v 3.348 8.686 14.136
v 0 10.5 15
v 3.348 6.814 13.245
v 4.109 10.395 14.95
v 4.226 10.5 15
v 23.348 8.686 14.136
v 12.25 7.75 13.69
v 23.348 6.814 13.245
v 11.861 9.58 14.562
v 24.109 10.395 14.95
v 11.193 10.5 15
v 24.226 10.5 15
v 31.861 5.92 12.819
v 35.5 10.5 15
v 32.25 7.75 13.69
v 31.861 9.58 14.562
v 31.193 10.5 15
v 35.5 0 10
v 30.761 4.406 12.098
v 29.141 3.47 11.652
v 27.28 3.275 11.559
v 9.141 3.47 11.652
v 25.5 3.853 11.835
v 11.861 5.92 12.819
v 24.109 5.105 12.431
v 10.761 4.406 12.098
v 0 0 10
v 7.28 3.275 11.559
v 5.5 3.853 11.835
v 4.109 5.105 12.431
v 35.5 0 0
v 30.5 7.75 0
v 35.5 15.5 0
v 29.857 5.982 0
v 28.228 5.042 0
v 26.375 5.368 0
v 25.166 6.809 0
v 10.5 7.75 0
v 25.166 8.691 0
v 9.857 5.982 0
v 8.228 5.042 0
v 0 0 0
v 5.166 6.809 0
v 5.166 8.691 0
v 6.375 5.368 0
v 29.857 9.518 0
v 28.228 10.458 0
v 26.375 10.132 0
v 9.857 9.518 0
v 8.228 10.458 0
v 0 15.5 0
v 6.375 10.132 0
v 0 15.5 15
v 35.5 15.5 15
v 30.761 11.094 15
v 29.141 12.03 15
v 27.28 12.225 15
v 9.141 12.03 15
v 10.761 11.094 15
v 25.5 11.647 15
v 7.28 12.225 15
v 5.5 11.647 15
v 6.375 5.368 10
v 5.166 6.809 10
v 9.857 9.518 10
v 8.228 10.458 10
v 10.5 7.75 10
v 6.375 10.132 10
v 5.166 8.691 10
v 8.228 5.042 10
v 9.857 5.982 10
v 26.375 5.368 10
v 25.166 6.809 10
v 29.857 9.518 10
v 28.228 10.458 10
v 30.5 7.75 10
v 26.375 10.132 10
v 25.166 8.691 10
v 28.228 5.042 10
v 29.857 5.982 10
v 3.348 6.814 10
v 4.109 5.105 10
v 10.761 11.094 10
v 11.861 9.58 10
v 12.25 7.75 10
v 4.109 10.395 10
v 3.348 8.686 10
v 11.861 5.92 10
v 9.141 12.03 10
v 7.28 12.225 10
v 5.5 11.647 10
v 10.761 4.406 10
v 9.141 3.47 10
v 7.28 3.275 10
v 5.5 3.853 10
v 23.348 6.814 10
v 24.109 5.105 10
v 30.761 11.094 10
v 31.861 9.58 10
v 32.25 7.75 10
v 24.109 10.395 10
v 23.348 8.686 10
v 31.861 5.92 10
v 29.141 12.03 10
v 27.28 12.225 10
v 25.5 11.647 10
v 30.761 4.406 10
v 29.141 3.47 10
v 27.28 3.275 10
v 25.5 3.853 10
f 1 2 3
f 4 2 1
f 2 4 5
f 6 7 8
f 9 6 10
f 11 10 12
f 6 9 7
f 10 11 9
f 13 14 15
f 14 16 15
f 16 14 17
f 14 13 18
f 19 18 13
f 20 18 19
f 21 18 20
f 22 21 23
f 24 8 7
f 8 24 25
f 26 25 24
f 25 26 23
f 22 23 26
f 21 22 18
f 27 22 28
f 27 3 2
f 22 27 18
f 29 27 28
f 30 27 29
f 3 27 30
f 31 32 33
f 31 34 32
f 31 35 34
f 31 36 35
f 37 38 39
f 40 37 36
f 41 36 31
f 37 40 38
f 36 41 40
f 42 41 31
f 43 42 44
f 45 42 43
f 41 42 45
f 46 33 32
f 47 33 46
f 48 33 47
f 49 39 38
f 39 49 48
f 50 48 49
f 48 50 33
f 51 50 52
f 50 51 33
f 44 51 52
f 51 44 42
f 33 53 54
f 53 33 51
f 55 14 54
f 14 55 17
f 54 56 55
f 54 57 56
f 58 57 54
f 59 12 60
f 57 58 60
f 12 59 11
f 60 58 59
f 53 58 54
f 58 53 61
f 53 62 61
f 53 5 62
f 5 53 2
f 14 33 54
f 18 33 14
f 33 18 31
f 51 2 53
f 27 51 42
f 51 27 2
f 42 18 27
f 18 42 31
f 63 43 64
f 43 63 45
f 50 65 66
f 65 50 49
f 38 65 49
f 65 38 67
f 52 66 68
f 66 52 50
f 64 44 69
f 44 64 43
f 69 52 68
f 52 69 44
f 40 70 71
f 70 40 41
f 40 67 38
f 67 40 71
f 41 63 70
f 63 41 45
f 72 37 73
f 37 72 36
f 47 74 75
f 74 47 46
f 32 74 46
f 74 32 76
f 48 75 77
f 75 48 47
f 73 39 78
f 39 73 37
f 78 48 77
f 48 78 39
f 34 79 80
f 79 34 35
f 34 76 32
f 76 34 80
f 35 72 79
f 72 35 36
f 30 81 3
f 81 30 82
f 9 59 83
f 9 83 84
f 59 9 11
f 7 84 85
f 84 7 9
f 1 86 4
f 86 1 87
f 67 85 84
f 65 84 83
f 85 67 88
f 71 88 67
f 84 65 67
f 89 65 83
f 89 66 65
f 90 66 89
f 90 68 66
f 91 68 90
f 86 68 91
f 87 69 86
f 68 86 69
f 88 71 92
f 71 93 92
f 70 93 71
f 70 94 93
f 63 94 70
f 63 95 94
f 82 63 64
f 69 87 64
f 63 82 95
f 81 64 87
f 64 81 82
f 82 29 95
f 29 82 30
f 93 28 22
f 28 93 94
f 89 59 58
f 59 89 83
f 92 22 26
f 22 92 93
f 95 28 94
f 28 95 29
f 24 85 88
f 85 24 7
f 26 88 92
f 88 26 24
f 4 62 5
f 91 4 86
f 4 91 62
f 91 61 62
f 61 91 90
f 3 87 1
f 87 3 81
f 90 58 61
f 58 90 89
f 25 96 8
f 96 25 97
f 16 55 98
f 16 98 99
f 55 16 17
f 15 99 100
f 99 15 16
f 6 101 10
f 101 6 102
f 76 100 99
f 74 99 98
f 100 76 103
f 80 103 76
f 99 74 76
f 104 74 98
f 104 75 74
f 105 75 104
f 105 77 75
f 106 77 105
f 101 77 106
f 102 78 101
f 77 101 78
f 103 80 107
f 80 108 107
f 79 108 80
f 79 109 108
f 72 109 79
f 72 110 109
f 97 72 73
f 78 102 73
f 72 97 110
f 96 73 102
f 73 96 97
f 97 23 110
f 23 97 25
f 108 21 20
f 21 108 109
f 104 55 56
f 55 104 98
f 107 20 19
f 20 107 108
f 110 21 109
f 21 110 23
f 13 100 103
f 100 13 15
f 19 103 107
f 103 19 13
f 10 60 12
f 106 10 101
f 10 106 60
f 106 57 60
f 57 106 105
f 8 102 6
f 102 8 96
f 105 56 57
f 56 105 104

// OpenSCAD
// Uncomment before rendering and exporting
//$fa = 0.01;
//$fs = 0.25;

// Module for creating the stop
module xAxisStop()
{
    difference()
    {
        // Base Shape
        hull()
        {
            cube([35.5, 15.5, 10]);
            translate([0, 10.5, 10])
            {
                cube([35.5, 5, 5]);
            }
        }
        // Screw holes
        translate([7.75, 7.75, -1])
        {
            cylinder(17, 2.75, 2.75);
        }
        translate([27.75, 7.75, -1])
        {
            cylinder(17, 2.75, 2.75);
        }
        // Screw head cutout
        translate([7.75, 7.75, 10])
        {
            cylinder(6, 4.5, 4.5);
        }
        translate([27.75, 7.75, 10])
        {
            cylinder(6, 4.5, 4.5);
        }
    }
}

// Using the module
xAxisStop();
